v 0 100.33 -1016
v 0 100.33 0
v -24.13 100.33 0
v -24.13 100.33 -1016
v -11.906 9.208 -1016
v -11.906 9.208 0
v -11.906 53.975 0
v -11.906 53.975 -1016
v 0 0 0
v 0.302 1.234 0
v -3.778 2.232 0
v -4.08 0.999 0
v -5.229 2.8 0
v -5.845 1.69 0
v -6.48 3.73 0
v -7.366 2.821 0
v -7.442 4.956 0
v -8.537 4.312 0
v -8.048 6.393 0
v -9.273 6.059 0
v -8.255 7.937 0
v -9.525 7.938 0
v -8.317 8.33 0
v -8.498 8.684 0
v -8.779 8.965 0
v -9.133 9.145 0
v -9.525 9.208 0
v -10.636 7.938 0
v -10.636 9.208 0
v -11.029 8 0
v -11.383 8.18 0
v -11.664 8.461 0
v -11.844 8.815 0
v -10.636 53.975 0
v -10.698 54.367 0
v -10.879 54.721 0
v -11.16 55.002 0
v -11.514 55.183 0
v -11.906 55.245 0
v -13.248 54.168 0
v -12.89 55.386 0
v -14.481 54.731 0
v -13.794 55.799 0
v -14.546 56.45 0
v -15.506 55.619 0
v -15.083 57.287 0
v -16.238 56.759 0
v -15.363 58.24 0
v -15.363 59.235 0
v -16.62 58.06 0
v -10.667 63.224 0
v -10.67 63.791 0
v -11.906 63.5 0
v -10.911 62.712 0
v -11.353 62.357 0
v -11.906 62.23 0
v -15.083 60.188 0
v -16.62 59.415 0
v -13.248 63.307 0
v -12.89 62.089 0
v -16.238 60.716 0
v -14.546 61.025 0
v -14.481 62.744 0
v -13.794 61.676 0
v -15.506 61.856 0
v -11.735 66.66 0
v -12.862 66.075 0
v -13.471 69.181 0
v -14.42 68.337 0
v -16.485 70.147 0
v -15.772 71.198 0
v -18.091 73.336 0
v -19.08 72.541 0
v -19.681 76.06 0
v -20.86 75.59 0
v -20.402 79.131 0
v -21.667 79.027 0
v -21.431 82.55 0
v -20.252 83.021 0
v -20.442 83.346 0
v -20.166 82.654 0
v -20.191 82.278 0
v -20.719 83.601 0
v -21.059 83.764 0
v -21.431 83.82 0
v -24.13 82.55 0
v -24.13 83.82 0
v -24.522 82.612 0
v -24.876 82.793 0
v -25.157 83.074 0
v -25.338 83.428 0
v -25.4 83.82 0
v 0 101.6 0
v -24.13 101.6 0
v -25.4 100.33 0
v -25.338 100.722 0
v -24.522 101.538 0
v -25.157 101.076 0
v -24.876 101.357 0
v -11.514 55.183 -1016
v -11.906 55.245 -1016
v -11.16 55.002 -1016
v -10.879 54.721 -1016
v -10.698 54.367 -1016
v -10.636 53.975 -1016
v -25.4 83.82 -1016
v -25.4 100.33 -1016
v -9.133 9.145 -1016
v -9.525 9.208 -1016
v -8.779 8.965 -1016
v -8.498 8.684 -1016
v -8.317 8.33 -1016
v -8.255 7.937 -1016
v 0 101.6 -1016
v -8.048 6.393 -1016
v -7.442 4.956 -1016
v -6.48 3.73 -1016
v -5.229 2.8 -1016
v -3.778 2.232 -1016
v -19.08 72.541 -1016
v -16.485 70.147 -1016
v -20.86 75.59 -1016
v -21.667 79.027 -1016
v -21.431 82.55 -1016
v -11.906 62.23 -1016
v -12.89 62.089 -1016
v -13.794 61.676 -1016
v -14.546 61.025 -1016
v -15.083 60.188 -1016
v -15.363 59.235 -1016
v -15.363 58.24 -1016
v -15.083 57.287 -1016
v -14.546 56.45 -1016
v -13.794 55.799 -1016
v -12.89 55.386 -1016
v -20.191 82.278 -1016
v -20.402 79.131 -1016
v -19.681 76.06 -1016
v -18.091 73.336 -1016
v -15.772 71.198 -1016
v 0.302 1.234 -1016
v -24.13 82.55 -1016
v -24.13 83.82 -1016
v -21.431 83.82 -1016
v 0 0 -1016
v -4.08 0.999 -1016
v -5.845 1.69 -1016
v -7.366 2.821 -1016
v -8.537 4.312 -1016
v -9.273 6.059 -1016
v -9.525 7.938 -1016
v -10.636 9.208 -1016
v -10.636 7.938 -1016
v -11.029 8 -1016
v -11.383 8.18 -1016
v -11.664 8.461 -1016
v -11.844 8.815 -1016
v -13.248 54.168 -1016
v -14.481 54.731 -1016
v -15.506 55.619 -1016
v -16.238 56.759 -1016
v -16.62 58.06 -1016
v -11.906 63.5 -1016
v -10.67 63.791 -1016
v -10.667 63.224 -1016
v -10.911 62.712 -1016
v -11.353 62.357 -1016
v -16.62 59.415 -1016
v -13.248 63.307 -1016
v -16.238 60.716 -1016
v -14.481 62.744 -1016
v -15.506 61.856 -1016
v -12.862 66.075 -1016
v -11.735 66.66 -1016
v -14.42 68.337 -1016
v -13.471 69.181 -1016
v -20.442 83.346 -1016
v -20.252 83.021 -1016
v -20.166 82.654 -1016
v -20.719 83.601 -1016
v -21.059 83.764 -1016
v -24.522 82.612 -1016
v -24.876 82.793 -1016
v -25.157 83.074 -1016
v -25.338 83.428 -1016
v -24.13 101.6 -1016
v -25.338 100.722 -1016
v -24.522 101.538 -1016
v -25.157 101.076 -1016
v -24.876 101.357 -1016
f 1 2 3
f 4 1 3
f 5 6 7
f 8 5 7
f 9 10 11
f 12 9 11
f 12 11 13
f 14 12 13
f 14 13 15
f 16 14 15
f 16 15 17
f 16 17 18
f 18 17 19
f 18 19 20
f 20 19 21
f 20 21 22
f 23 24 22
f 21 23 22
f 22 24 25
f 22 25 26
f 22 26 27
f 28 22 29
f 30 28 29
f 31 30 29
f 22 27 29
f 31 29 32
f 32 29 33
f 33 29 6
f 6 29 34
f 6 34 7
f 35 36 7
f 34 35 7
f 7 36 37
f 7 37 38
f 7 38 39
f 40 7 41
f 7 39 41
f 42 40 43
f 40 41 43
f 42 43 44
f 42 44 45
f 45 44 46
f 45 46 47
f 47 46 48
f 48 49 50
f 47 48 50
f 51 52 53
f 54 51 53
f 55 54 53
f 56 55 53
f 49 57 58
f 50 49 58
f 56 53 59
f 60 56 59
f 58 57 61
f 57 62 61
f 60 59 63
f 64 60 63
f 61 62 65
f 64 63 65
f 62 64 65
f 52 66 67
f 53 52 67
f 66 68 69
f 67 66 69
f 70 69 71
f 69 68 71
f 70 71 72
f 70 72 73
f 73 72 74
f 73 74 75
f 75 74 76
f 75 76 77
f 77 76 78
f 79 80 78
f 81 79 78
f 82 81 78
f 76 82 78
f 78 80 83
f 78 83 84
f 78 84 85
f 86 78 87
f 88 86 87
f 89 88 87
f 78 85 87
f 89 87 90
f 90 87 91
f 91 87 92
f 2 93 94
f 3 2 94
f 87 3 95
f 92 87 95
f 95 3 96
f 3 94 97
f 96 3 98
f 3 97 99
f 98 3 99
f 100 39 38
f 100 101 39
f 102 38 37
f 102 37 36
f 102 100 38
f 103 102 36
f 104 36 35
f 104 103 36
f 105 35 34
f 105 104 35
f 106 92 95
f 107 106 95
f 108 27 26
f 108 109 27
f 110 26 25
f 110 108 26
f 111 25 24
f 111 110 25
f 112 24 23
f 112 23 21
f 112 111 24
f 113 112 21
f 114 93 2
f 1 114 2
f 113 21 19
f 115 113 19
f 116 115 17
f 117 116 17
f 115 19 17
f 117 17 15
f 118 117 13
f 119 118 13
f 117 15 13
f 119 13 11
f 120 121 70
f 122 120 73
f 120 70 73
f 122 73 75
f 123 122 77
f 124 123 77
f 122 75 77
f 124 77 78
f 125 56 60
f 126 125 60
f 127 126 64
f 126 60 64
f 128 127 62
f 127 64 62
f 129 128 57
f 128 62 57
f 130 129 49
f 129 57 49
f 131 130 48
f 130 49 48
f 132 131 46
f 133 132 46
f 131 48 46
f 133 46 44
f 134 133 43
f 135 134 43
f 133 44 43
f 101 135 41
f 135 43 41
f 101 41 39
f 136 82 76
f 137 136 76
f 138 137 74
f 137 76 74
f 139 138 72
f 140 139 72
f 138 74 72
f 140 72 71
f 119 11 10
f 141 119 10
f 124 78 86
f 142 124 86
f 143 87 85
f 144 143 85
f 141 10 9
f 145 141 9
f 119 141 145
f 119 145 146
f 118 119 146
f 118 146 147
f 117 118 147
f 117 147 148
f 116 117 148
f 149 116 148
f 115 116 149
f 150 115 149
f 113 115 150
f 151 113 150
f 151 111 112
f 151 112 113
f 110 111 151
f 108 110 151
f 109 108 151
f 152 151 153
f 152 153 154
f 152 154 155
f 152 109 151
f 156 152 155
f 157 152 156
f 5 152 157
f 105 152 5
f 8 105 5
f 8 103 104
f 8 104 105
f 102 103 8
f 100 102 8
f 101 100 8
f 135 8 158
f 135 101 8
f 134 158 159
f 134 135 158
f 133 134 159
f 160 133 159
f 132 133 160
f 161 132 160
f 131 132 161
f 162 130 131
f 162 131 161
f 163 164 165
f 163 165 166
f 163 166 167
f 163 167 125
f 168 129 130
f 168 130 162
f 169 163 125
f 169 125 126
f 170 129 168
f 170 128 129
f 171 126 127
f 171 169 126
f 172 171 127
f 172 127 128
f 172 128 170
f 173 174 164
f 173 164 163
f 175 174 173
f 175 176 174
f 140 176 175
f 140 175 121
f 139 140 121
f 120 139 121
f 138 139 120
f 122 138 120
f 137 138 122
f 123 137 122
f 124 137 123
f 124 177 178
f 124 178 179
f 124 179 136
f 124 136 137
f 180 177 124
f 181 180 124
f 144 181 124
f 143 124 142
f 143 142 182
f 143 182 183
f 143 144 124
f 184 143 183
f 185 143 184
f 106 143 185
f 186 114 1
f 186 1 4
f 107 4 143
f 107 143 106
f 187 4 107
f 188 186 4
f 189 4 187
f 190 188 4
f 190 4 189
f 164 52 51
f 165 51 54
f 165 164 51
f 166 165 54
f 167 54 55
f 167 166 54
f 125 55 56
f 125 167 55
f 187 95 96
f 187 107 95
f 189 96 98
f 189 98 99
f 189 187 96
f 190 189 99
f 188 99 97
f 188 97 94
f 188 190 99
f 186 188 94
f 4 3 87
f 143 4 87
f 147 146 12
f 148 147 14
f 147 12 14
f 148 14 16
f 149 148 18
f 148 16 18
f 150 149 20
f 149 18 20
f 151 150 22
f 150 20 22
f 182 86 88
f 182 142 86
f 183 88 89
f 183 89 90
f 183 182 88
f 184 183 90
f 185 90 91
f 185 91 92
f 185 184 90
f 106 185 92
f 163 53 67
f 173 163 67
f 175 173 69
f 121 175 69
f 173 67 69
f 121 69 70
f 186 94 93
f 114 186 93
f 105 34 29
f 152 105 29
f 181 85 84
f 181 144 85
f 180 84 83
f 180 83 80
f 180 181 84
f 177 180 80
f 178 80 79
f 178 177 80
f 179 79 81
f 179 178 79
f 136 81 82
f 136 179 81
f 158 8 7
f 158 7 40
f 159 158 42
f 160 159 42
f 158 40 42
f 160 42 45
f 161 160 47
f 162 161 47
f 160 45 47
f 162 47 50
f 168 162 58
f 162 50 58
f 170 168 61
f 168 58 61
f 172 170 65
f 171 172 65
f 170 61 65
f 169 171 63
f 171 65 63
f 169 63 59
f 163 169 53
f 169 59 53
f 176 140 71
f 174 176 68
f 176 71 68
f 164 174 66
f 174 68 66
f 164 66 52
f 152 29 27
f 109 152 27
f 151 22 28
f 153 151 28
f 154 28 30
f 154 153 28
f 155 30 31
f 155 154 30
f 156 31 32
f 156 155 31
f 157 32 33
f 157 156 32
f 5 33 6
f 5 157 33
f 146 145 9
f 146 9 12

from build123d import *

# Parameters (mm, degrees)
EXTRUDE_THIN1_DEPTH = 1016
FILLET1_R           = 1.27


with BuildPart() as part:
    # Sketch1 → Extrude-Thin1 (new body)
    with BuildSketch(Plane.XY):
        with BuildLine():
            Line((0, 0), (-4.079695, 0.998592))
            ThreePointArc((-4.079695, 0.998592), (-8.001144, 3.52729), (-9.525, 7.9375))
            Line((-9.525, 7.9375), (-11.90625, 7.9375))
            Line((-11.90625, 7.9375), (-11.90625, 53.975))
            ThreePointArc((-11.90625, 53.975), (-16.66875, 58.7375), (-11.906249, 63.5))
            ThreePointArc((-11.906249, 63.5), (-13.570529, 67.254051), (-16.484535, 70.147372))
            ThreePointArc((-16.484535, 70.147372), (-20.860175, 75.589972), (-21.43125, 82.55))
            Line((-21.43125, 82.55), (-25.4, 82.55))
            Line((-25.4, 82.55), (-25.4, 101.6))
            Line((-25.4, 101.6), (0, 101.6))
            Line((0, 101.6), (0, 100.33))
            Line((0, 100.33), (-24.13, 100.33))
            Line((-24.13, 100.33), (-24.13, 83.82))
            Line((-24.13, 83.82), (-19.728013, 83.82))
            ThreePointArc((-19.728013, 83.82), (-19.950403, 76.819407), (-15.771635, 71.198406))
            ThreePointArc((-15.771635, 71.198406), (-12.006284, 67.154926), (-10.374537, 61.876196))
            ThreePointArc((-10.374537, 61.876196), (-15.395826, 58.880375), (-10.63625, 55.484093))
            Line((-10.63625, 55.484093), (-10.63625, 9.2075))
            Line((-10.63625, 9.2075), (-8.116059, 9.2075))
            ThreePointArc((-8.116059, 9.2075), (-7.369003, 4.835362), (-3.777749, 2.232175))
            Line((-3.777749, 2.232175), (0.301946, 1.233584))
            Line((0.301946, 1.233584), (0, 0))
        make_face()
    extrude(amount=-EXTRUDE_THIN1_DEPTH)

    # Fillet1
    fillet1_edges = [part.edges().sort_by_distance(p)[0] for p in [
        (-19.728013, 83.82, -508),
        (-10.374537, 61.876196, -508),
        (-10.63625, 55.484093, -508),
        (-8.116059, 9.2075, -508),
        (-11.90625, 7.9375, -508),
        (-25.4, 82.55, -508),
        (-25.4, 101.6, -508),
    ]]
    fillet(fillet1_edges, radius=FILLET1_R)


solid = part.part
